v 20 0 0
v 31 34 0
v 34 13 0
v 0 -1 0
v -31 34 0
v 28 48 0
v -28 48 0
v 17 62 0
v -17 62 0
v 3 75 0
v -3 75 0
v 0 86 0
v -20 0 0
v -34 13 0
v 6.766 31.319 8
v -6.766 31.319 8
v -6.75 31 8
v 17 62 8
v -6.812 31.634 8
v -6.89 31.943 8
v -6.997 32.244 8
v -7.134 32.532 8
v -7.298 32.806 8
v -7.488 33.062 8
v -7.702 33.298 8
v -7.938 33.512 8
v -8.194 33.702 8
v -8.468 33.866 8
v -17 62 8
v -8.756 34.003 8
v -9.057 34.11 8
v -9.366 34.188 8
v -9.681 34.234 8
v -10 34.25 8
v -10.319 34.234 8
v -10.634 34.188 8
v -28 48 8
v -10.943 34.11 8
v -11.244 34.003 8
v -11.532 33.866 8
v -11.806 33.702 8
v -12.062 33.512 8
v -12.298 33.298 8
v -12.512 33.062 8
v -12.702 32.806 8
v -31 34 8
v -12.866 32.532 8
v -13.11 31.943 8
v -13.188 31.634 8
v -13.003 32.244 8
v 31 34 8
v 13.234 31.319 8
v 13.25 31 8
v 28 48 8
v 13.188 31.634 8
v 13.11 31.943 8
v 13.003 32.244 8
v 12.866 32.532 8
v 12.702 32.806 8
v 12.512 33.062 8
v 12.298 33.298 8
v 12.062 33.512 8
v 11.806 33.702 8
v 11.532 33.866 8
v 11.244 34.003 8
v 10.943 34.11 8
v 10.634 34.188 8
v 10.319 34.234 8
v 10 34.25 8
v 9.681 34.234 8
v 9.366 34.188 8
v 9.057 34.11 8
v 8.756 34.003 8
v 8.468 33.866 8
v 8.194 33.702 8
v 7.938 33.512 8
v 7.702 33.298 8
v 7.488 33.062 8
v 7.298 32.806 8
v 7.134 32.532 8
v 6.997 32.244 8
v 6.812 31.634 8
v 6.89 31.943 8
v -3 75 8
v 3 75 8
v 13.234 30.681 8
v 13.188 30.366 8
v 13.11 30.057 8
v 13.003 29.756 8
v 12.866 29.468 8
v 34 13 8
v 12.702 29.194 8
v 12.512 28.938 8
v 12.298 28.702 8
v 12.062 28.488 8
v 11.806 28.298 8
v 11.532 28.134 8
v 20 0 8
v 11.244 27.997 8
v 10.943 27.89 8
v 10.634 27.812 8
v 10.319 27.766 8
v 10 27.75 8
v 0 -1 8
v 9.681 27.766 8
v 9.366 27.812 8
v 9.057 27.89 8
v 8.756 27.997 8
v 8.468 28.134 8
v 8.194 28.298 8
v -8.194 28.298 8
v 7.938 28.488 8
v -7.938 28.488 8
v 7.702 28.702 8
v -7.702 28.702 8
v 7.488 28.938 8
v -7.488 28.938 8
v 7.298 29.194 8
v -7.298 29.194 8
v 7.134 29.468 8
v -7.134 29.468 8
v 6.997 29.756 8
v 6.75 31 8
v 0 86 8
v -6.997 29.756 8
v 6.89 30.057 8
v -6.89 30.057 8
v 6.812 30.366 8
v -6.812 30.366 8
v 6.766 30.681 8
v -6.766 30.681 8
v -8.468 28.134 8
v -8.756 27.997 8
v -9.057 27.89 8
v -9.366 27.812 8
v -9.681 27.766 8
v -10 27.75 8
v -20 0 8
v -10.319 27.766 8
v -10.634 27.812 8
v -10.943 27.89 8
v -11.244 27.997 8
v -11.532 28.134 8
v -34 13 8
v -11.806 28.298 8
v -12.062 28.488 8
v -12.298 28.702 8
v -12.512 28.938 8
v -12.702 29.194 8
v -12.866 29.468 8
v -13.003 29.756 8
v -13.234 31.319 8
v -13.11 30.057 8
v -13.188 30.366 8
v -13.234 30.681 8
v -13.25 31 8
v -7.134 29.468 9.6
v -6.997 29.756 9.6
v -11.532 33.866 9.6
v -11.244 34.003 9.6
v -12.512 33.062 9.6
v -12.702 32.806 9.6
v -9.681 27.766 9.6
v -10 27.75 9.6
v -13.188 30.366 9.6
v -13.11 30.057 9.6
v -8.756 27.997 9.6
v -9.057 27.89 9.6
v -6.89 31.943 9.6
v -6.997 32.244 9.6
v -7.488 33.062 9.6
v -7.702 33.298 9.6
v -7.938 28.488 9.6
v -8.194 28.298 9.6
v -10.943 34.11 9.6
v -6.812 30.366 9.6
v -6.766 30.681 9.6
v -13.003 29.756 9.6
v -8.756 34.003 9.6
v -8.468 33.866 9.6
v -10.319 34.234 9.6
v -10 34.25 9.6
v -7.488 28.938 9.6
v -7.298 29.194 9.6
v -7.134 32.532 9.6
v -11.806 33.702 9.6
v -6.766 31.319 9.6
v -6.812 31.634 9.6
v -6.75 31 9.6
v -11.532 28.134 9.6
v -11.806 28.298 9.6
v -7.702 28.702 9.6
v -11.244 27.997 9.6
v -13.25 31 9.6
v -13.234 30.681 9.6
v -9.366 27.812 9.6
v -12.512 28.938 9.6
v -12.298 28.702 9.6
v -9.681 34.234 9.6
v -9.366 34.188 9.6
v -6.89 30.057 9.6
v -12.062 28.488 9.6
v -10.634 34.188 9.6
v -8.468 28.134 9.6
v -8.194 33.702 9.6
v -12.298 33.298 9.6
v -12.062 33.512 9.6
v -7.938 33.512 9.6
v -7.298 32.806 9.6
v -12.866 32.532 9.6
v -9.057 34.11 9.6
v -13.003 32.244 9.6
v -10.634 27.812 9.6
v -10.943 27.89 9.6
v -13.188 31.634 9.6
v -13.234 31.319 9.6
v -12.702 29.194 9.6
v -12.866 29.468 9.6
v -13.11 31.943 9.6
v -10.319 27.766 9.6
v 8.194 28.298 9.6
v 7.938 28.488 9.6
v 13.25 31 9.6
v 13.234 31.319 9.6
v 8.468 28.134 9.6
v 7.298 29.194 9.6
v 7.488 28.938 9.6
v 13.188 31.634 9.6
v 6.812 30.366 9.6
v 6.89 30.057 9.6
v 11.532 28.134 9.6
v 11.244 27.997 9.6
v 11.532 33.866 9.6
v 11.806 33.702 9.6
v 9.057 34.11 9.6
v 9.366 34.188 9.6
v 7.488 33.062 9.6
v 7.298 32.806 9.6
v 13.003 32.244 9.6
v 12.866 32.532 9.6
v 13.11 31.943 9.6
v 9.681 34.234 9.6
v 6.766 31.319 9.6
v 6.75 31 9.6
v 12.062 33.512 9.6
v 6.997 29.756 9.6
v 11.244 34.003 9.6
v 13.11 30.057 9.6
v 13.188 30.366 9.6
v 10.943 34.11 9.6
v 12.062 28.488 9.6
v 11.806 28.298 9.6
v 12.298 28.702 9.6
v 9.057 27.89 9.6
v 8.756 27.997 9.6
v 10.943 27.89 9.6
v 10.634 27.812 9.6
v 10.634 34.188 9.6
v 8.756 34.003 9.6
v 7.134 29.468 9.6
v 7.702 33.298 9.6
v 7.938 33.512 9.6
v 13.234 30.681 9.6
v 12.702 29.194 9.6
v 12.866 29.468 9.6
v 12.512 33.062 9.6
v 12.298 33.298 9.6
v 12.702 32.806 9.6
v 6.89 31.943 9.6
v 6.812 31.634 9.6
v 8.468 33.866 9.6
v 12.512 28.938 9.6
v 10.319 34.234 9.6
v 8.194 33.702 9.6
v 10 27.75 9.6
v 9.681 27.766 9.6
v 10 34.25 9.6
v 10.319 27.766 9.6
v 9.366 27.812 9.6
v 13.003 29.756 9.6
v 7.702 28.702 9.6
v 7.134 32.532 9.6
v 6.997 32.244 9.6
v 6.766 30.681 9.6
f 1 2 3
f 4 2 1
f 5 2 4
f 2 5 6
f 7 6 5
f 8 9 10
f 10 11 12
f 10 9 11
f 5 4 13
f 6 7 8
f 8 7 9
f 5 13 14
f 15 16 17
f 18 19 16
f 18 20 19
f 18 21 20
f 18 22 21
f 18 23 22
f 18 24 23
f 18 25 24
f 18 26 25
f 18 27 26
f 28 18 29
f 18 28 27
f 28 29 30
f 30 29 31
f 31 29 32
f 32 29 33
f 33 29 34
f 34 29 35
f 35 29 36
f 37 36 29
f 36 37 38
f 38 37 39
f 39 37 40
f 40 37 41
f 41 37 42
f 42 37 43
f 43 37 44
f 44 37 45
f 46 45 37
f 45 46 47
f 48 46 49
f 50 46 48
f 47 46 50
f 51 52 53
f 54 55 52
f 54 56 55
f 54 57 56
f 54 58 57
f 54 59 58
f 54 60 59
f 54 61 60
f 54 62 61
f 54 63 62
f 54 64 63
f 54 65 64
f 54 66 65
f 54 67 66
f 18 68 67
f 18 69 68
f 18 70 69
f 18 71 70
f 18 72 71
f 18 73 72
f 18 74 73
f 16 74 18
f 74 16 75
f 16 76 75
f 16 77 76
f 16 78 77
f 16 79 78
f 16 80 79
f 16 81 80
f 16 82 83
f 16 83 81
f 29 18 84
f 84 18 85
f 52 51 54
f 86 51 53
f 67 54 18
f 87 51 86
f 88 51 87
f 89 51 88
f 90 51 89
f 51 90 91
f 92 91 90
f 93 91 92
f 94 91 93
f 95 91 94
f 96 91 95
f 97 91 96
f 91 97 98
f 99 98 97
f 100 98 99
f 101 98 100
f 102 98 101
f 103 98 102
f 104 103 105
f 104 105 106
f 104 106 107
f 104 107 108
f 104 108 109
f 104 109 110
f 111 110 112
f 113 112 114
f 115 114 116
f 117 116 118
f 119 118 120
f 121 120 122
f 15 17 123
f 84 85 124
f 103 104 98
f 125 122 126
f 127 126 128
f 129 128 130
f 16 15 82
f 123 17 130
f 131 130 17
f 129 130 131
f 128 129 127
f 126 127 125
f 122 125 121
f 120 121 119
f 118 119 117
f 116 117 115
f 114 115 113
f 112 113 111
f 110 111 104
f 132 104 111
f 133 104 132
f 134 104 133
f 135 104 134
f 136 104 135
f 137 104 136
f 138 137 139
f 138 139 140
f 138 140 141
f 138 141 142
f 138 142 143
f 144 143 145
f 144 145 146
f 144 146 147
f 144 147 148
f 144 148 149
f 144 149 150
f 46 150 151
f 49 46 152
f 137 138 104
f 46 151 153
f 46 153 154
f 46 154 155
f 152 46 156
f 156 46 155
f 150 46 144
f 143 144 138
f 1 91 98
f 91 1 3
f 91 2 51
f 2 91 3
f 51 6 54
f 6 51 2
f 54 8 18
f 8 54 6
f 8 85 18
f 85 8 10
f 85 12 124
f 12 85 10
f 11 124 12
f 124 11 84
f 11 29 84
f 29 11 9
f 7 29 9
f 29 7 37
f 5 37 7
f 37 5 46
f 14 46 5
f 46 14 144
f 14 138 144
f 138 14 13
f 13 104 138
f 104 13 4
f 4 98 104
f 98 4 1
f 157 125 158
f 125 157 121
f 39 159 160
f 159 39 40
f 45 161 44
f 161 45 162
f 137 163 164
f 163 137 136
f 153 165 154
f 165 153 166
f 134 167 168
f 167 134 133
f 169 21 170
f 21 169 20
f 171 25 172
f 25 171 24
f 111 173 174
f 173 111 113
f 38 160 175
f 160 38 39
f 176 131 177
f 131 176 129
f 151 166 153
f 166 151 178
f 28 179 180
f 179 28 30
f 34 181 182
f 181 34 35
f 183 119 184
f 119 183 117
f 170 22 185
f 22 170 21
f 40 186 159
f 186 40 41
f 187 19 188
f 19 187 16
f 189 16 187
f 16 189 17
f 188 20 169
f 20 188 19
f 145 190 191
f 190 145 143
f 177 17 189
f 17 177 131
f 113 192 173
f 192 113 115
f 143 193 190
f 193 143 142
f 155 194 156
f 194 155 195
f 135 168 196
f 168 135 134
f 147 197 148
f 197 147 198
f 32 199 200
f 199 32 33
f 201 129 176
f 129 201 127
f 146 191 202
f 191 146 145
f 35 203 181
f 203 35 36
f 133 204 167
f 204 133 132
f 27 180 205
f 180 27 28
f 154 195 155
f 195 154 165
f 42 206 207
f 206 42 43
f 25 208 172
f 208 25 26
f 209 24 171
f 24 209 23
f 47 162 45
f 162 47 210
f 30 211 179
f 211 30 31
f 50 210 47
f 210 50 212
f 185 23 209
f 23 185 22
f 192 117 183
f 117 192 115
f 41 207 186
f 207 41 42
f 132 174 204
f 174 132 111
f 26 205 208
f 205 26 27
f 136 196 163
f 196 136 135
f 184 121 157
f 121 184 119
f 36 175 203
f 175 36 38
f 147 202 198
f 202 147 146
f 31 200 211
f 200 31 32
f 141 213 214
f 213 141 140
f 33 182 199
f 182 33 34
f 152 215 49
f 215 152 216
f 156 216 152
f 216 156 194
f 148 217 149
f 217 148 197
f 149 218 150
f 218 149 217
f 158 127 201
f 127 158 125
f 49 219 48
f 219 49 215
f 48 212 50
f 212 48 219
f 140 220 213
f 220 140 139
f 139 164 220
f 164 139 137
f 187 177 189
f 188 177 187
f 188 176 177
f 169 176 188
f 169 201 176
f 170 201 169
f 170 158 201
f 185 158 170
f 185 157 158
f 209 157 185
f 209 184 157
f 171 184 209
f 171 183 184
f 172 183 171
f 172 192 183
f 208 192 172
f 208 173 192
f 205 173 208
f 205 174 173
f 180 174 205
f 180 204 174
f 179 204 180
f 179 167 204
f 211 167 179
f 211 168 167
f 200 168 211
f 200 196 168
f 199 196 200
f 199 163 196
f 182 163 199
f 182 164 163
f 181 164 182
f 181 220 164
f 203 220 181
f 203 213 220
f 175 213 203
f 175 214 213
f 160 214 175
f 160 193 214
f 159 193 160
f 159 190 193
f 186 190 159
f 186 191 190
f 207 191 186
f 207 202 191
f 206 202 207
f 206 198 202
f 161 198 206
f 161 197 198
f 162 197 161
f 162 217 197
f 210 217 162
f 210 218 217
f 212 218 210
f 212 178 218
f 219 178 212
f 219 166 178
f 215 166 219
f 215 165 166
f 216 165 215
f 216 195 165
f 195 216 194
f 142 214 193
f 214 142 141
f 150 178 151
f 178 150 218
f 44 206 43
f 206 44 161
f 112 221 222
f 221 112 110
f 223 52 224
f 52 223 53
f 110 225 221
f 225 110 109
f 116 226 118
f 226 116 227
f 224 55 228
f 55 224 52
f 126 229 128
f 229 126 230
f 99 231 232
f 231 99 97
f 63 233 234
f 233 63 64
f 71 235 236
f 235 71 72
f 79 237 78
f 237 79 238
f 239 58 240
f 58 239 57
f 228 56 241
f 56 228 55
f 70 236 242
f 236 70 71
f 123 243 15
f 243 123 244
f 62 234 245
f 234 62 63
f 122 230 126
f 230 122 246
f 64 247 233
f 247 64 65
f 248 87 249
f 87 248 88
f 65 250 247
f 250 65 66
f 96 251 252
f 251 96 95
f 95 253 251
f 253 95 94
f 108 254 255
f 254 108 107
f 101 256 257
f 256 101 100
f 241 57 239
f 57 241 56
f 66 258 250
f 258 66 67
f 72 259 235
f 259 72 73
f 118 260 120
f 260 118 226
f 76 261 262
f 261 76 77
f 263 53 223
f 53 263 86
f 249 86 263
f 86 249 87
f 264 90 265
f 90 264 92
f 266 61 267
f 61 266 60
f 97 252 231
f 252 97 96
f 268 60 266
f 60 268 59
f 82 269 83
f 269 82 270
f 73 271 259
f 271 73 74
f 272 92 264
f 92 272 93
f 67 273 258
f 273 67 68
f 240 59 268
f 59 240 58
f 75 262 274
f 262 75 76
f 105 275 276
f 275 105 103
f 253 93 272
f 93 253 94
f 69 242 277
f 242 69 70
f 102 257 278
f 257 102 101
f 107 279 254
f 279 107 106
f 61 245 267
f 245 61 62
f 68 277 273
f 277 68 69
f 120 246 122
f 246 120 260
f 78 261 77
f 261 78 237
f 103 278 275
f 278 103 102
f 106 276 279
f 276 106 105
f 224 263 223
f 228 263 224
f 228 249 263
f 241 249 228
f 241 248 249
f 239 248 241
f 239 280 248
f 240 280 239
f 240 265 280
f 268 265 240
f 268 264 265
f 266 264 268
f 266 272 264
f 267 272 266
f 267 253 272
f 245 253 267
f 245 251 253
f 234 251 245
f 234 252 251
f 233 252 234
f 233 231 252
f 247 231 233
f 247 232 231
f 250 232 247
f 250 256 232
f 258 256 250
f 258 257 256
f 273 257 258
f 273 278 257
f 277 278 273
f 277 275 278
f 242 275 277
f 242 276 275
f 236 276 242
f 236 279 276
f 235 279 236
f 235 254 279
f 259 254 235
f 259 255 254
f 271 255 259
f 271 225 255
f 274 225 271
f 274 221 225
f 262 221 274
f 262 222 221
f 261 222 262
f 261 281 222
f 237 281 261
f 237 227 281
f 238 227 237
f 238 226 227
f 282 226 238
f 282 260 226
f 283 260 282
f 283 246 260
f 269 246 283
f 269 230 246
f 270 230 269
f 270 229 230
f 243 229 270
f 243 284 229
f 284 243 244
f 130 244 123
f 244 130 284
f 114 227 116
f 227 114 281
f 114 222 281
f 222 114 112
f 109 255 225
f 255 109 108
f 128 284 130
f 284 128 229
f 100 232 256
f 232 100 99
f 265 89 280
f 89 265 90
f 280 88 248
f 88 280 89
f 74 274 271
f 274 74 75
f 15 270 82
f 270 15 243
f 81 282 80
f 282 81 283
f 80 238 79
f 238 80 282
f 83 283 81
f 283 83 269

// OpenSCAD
/*
  GOTA — Aqua printable mascot
  Finished size: approximately 64 x 86 x 9.6 mm
  Printing: place the flat back on the build plate; no supports required.
  Suggested FDM settings: 0.20 mm layers, 3 walls, 15% infill.
*/

$fn = 64;

body_points = [
  [0,86],[-3,75],[-17,62],[-28,48],[-31,34],[-34,13],[-20,0],
  [0,-1],[20,0],[34,13],[31,34],[28,48],[17,62],[3,75]
];

module body() {
  linear_extrude(height=8)
    polygon(points=body_points);
}

module eye(x) {
  translate([x,31,7.6]) cylinder(h=2, r=3.25);
}

module smile() {
  // A restrained embossed arc made from overlapping round segments.
  for (x=[-9:-1.5:7.5]) {
    y = 18 - 0.055*x*x;
    translate([x,y,7.6]) cylinder(h=2, r=1.45);
  }
}

union() {
  body();
  eye(-10);
  eye(10);
  smile();
}
